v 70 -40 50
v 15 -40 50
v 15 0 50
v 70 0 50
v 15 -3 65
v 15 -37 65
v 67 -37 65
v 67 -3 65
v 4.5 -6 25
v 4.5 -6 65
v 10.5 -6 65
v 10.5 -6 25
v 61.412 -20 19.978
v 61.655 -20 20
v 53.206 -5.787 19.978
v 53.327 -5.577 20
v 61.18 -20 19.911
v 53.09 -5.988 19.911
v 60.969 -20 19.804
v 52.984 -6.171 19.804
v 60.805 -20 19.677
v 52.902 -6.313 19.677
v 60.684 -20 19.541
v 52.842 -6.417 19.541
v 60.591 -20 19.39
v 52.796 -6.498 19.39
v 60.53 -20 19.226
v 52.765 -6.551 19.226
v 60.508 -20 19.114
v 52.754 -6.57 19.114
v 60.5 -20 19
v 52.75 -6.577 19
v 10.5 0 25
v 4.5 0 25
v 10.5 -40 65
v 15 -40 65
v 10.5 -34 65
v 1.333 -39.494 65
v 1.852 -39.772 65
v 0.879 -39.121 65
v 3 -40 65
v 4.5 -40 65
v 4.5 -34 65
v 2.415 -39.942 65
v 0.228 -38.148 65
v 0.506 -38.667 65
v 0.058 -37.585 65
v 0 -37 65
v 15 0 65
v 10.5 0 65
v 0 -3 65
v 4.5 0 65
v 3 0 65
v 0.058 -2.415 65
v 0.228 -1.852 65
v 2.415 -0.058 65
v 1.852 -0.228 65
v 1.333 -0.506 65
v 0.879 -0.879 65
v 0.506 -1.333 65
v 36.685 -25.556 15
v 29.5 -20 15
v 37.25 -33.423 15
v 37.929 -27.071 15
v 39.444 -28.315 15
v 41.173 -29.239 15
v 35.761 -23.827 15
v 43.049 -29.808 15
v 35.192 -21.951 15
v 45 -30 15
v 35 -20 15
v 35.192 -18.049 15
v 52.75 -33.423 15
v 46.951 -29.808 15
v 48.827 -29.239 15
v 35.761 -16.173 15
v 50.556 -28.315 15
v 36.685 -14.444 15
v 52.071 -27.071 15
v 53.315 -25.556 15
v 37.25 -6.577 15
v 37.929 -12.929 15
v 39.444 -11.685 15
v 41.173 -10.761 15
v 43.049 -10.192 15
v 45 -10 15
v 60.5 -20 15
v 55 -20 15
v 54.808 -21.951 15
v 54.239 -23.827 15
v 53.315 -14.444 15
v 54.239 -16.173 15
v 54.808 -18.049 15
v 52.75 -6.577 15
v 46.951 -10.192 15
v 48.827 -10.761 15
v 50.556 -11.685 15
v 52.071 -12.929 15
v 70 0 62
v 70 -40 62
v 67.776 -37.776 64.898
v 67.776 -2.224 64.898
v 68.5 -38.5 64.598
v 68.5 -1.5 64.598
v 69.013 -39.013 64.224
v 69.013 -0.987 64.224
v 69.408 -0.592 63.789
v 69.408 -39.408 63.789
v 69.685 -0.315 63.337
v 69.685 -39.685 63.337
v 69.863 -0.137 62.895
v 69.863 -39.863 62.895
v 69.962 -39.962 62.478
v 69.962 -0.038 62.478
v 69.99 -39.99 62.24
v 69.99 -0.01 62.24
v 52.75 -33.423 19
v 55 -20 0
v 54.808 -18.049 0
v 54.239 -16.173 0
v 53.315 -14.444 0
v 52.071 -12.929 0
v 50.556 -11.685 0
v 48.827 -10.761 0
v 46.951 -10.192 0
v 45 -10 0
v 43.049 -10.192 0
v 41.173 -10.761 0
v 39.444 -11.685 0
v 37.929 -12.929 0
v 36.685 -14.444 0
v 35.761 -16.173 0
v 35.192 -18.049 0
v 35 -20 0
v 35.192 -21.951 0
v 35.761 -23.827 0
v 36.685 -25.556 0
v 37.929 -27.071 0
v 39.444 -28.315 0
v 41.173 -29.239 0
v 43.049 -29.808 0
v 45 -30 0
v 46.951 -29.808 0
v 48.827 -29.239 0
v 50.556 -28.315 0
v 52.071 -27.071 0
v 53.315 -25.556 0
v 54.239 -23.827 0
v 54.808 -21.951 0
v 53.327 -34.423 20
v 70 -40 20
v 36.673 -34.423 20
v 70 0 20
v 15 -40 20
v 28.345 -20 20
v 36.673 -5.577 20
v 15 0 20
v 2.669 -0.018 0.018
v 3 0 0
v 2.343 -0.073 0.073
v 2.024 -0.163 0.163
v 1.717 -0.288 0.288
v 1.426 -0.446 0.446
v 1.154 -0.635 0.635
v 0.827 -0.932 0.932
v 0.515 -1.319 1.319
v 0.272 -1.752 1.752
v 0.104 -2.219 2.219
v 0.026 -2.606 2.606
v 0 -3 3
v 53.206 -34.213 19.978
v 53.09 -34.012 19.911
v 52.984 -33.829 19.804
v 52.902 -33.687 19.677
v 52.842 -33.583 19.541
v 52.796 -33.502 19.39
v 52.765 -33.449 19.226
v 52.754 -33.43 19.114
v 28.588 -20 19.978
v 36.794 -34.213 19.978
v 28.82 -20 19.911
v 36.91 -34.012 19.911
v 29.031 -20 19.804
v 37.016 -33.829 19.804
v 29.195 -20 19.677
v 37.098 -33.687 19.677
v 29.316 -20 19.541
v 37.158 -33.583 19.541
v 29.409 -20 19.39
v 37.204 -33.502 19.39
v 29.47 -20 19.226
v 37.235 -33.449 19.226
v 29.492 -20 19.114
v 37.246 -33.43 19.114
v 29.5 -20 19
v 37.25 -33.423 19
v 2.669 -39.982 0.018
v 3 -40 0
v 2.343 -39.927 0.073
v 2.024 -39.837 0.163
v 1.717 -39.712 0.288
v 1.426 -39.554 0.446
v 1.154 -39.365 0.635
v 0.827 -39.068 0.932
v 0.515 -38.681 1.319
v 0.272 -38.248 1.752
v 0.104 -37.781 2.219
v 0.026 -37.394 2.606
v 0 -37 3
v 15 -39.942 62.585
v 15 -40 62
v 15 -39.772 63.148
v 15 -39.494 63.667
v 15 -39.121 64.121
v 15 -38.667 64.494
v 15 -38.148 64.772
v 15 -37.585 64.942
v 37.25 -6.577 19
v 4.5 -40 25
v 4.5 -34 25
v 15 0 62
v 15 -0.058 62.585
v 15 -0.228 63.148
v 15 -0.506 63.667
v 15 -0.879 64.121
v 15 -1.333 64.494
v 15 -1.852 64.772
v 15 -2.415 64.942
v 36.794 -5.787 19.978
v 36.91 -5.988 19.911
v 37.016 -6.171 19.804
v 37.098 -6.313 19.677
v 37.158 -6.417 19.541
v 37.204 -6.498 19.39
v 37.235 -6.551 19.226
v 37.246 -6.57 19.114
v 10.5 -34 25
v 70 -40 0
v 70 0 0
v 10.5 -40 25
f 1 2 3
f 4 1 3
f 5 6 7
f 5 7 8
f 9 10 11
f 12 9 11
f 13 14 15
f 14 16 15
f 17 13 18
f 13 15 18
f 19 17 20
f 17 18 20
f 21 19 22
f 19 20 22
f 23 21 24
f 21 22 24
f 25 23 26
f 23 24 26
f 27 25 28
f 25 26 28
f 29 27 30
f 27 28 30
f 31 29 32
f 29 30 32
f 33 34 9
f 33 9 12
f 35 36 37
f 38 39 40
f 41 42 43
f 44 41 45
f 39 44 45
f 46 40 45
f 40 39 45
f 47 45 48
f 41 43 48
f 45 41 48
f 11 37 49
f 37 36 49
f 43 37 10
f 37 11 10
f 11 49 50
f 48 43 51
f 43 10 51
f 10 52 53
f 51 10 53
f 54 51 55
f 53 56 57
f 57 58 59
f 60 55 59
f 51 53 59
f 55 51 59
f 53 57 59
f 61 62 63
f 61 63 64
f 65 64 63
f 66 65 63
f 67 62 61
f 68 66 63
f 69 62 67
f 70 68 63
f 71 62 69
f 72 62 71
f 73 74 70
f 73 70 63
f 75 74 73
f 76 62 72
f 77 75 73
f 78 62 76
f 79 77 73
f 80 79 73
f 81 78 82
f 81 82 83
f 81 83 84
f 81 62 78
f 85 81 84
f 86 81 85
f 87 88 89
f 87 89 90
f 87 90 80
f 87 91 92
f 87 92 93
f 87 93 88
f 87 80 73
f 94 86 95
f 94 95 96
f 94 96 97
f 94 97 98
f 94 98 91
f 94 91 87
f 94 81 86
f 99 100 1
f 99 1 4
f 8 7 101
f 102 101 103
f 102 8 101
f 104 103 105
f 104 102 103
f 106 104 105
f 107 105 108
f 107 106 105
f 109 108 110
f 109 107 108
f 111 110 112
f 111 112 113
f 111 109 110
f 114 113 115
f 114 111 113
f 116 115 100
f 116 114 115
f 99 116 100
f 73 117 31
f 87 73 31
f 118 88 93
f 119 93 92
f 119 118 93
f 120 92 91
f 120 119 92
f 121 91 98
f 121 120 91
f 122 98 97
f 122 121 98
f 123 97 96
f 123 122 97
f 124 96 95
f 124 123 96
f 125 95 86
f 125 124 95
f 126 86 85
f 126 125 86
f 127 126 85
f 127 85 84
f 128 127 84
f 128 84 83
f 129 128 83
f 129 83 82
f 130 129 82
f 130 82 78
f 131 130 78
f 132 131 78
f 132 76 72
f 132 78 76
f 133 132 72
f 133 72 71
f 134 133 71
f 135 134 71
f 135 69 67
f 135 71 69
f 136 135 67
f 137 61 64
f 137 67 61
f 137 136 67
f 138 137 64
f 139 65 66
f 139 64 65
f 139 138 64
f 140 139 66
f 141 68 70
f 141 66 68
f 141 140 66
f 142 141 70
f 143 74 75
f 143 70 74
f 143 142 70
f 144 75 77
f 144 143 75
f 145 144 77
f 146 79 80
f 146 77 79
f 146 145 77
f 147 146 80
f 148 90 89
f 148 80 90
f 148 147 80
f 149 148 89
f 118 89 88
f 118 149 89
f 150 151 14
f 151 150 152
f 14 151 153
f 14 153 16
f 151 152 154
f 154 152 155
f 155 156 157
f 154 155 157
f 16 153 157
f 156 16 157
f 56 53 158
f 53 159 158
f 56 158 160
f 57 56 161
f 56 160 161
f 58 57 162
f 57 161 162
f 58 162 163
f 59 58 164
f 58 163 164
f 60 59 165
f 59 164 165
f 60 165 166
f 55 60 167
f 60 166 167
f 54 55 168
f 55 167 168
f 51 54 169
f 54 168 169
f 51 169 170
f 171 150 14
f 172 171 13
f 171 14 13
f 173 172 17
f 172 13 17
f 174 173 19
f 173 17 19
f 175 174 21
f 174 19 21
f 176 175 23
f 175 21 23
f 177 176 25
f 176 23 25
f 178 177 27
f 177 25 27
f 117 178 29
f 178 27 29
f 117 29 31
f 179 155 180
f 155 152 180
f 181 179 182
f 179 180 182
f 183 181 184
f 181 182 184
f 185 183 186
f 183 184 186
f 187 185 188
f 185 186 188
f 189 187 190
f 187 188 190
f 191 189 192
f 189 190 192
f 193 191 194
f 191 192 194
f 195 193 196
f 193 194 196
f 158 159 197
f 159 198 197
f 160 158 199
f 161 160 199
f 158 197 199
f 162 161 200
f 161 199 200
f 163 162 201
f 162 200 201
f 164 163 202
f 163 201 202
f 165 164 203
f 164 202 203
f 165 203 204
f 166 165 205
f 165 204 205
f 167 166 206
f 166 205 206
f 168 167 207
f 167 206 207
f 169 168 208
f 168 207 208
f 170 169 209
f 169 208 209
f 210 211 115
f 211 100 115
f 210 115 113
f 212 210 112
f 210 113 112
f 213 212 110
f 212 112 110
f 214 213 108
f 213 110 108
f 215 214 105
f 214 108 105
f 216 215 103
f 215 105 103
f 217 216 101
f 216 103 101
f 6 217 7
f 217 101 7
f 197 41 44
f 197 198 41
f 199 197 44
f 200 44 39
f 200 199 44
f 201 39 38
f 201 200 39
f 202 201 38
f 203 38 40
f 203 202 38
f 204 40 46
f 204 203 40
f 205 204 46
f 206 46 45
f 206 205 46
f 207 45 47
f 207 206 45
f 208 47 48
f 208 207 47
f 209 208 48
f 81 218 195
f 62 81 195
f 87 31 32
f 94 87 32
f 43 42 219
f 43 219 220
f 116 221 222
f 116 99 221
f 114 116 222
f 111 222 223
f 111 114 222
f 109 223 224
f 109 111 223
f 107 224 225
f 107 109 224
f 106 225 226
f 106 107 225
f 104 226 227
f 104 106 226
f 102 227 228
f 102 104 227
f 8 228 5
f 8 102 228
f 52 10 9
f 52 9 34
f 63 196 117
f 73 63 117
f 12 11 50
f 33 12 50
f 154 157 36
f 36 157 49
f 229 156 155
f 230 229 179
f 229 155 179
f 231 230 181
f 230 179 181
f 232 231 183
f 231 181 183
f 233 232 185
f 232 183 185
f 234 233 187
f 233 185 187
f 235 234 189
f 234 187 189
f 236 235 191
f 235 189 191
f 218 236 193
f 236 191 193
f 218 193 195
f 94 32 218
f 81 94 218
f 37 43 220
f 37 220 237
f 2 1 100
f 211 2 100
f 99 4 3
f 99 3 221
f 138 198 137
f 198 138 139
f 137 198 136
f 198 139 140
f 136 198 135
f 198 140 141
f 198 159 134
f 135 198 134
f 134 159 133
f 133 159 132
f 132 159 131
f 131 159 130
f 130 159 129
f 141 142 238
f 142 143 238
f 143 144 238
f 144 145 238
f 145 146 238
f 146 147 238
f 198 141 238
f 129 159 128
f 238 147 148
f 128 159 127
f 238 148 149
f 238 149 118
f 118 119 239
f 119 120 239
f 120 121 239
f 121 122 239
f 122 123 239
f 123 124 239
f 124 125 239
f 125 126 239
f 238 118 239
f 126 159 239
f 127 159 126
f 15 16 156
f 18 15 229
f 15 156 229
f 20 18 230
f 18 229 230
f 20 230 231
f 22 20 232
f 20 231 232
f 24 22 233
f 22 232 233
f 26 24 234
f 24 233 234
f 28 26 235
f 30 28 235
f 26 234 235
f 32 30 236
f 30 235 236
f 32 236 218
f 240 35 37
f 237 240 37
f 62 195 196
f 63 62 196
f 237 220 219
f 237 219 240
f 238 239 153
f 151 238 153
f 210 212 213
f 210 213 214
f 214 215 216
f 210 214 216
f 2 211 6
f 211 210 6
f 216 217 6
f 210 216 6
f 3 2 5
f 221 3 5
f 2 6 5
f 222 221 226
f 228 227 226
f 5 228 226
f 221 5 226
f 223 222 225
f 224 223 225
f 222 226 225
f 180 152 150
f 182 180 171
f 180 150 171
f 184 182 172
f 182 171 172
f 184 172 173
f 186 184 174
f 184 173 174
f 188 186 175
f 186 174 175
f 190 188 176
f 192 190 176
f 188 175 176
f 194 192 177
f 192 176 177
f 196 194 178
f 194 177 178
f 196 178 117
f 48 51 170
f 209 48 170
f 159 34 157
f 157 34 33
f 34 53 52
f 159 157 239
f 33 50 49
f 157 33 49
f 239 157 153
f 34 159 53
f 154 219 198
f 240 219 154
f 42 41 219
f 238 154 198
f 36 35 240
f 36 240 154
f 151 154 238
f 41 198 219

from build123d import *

# Parameters (mm, degrees)
PAD_DEPTH       = 40
POCKET_DEPTH    = 5
FILLET001_R     = 1
SKETCH005_R     = 10
POCKET001_DEPTH = 20
FILLET002_R     = 3
SKETCH006_W     = 6
SKETCH006_H     = 10
POCKET002_DEPTH = 45
SKETCH003_W     = 40
SKETCH003_H     = 15
PAD002_DEPTH    = 55
FILLET_R        = 3


with BuildPart() as body:
    # Sketch → Pad (new body)
    with BuildSketch(Plane.XZ):
        Polygon((0, 0), (70, 0), (70, 20), (15, 20), (15, 50), (15, 50), (15, 44.99994), (15, 65), (0, 65), align=None)
    extrude(amount=PAD_DEPTH)

    # Sketch004 → Pocket (cut)
    with BuildSketch(Plane.XY.offset(20)):
        Polygon((29.5, -20), (37.25, -33.423394), (52.75, -33.423394), (60.5, -20), (52.75, -6.576606), (37.25, -6.576606), align=None)
    extrude(amount=-POCKET_DEPTH, mode=Mode.SUBTRACT)

    # Fillet001
    fillet001_edges = [body.edges().sort_by_distance(p)[0] for p in [
        (33.375, -13.288303, 20),
        (45, -6.576606, 20),
        (56.625, -13.288303, 20),
        (56.625, -26.711697, 20),
        (45, -33.423394, 20),
        (33.375, -26.711697, 20),
    ]]
    fillet(fillet001_edges, radius=FILLET001_R)

    # Sketch005 → Pocket001 (cut)
    with BuildSketch(Plane.XY):
        with Locations((45, -20)):
            Circle(SKETCH005_R)
    extrude(amount=POCKET001_DEPTH, mode=Mode.SUBTRACT)

    # Fillet002
    fillet002_edges = [body.edges().sort_by_distance(p)[0] for p in [
        (0, -20, 0),
        (0, 0, 32.5),
        (0, -40, 32.5),
    ]]
    fillet(fillet002_edges, radius=FILLET002_R)

    # Sketch006 → Pocket002 (cut)
    with BuildSketch(Plane.XY.offset(70)):
        with Locations((7.5, -1)):
            Rectangle(SKETCH006_W, SKETCH006_H)
        with Locations((7.5, -39)):
            Rectangle(SKETCH006_W, SKETCH006_H)
    extrude(amount=-POCKET002_DEPTH, mode=Mode.SUBTRACT)


with BuildPart() as body001:
    # Sketch003 → Pad002 (new body)
    with BuildSketch(Plane.YZ.offset(15)):
        with Locations((-20, 57.5)):
            Rectangle(SKETCH003_W, SKETCH003_H)
    extrude(amount=PAD002_DEPTH)

    # Fillet
    fillet_edges = [body001.edges().sort_by_distance(p)[0] for p in [
        (70, -20, 65),
        (42.5, 0, 65),
        (42.5, -40, 65),
    ]]
    fillet(fillet_edges, radius=FILLET_R)


solid = Compound([body.part, body001.part])
